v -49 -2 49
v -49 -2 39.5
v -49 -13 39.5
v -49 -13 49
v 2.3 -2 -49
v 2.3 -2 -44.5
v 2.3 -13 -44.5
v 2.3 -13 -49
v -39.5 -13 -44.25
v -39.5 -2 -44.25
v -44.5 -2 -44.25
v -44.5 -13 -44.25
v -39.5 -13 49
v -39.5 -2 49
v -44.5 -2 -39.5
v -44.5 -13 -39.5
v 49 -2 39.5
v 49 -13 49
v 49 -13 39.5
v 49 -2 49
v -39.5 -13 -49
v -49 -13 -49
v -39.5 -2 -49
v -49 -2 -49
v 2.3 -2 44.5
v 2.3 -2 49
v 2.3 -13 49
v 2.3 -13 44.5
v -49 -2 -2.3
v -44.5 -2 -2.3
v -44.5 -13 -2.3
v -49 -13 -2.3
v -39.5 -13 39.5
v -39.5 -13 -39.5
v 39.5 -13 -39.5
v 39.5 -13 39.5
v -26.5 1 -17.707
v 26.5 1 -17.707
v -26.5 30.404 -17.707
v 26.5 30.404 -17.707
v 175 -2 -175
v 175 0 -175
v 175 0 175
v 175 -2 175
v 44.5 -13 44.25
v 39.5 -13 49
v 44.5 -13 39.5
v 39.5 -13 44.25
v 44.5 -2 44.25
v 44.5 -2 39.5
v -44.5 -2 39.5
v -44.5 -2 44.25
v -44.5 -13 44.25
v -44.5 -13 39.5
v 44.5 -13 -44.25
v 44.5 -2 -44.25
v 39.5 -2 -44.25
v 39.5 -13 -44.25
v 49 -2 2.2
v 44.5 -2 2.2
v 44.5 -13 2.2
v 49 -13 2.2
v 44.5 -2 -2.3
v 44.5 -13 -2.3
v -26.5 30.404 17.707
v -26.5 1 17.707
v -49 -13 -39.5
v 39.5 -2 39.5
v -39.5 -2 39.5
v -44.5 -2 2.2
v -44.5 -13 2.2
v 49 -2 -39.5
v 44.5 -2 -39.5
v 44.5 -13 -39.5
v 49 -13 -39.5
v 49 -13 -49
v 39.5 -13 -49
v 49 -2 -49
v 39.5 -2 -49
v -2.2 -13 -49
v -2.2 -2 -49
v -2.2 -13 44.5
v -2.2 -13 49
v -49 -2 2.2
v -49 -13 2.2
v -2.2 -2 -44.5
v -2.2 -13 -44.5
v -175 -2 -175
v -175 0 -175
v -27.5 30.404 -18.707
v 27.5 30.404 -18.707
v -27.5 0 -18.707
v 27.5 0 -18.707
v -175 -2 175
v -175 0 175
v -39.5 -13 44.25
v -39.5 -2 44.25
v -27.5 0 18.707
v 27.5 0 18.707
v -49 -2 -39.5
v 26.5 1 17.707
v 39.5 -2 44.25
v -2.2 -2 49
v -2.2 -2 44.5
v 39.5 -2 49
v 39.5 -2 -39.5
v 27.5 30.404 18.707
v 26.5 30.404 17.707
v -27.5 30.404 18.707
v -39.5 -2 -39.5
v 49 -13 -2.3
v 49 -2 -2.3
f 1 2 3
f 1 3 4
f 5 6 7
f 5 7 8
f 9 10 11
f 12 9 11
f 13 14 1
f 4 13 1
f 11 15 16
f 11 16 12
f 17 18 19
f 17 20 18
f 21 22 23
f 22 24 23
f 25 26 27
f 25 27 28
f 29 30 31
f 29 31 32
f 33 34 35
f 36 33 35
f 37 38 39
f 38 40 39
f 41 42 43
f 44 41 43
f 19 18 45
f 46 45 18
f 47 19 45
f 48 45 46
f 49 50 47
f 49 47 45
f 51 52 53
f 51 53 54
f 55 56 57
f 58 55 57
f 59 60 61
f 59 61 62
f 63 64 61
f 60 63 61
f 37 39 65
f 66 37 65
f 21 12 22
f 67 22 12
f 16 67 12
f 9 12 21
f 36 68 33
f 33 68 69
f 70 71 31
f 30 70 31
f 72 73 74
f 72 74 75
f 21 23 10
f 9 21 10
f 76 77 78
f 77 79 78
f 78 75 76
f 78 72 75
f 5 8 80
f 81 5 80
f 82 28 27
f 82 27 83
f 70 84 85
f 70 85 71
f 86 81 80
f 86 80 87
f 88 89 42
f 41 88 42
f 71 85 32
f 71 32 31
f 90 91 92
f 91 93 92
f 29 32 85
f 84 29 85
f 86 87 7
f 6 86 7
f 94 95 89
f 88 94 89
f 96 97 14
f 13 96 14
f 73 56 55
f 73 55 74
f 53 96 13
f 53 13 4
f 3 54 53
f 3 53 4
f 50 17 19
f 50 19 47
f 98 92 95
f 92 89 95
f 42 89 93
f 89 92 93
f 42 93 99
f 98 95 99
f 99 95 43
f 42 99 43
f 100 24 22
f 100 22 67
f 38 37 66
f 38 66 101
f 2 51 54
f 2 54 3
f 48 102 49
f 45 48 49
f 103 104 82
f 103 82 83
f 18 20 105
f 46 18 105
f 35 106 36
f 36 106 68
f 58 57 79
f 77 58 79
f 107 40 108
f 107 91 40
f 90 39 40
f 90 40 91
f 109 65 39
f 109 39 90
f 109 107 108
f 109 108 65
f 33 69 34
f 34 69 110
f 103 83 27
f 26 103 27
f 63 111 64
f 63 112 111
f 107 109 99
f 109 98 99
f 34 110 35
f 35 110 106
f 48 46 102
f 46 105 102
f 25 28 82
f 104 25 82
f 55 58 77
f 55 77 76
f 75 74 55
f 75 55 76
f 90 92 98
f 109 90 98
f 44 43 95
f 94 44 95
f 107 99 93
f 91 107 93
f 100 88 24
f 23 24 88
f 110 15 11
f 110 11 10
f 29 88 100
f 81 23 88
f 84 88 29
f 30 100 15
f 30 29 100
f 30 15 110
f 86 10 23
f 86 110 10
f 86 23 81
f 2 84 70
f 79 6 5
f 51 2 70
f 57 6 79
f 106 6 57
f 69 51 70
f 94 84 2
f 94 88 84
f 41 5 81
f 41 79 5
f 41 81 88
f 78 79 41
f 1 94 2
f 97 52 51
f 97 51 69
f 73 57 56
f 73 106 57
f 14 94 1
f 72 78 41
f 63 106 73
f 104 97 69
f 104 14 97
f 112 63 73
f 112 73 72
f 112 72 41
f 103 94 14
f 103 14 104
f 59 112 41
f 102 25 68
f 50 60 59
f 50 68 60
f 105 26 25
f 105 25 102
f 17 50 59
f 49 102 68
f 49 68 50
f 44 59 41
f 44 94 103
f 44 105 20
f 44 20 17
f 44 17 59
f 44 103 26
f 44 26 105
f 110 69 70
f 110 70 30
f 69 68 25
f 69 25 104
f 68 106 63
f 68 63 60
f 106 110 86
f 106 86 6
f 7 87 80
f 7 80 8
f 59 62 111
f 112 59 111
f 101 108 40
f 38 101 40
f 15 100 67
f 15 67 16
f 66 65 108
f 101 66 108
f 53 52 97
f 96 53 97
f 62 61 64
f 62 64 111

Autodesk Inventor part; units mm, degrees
ref_plane "YZ Plane" through (0, 0, 0) normal (1, 0, 0) x (0, 1, 0)
ref_plane "XZ Plane" through (0, 0, 0) normal (0, 1, 0) x (-1, 0, 0)
ref_plane "XY Plane" through (0, 0, 0) normal (0, 0, 1) x (1, 0, 0)
sketch "Sketch1" plane through (0, 0, 0) normal (0, 1, 0) x (-1, 0, 0)
  line L0 (27.5, 18.707) -> (-27.5, 18.707)
  line L1 (-27.5, 18.707) -> (-27.5, -18.707)
  line L2 (-27.5, -18.707) -> (27.5, -18.707)
  line L3 (27.5, -18.707) -> (27.5, 18.707)
  line L4 (27.5, 18.707) -> (-27.5, -18.707) construction
  line L5 (-27.5, 18.707) -> (27.5, -18.707) construction
  point P0 (0, 0)
  dimension "d0" = 37.414
  dimension "d1" = 55
extrude "Extrusion1" add sketch "Sketch1" along normal blind 30.404
sketch "Sketch2" plane through (0, 30.404, 0) normal (0, 1, 0) x (1, 0, 0)
  line L0 (-26.5, -17.707) -> (26.5, -17.707)
  line L1 (26.5, -17.707) -> (26.5, 17.707)
  line L2 (26.5, 17.707) -> (-26.5, 17.707)
  line L3 (-26.5, 17.707) -> (-26.5, -17.707)
  line L4 (-26.5, -17.707) -> (26.5, 17.707) construction
  line L5 (26.5, -17.707) -> (-26.5, 17.707) construction
  point P0 (0, 0)
  dimension "d4" = 35.414
  dimension "d5" = 53
extrude "Extrusion2" cut sketch "Sketch2" against normal blind 29.404
sketch "Sketch6" plane through (0, 0, 0) normal (0, -1, 0) x (1, 0, 0)
  line L0 (175, 175) -> (-175, 175)
  line L1 (-175, 175) -> (-175, -175)
  line L2 (-175, -175) -> (175, -175)
  line L3 (175, -175) -> (175, 175)
  line L4 (175, 175) -> (-175, -175) construction
  line L5 (-175, 175) -> (175, -175) construction
  point P0 (0, 0)
  dimension "d19" = 350
  dimension "d20" = 350
extrude "Extrusion4" add sketch "Sketch6" along normal blind 2
sketch "Sketch7" plane through (0, -2, 0) normal (0, -1, 0) x (1, 0, 0)
  line L0 (39.5, 39.5) -> (-39.5, 39.5)
  line L1 (-39.5, 39.5) -> (-39.5, -39.5)
  line L2 (-39.5, -39.5) -> (39.5, -39.5)
  line L3 (39.5, -39.5) -> (39.5, 39.5)
  line L4 (39.5, 39.5) -> (-39.5, -39.5) construction
  line L5 (-39.5, 39.5) -> (39.5, -39.5) construction
  point P0 (0, 0)
  dimension "d23" = 79
  dimension "d24" = 79
extrude "Extrusion5" add sketch "Sketch7" along normal blind 11
sketch "Sketch8" plane through (0, -2, 0) normal (0, -1, 0) x (1, 0, 0)
  line L0 (2.3, -49) -> (-2.2, -49)
  line L1 (-2.2, -49) -> (-2.2, -44.5)
  line L2 (-2.2, -44.5) -> (2.3, -44.5)
  line L3 (2.3, -44.5) -> (2.3, -49)
  line L4 (2.3, -49) -> (-2.2, -44.5) construction
  line L5 (-2.2, -49) -> (2.3, -44.5) construction
  line L6 (-39.5, -39.5) -> (39.5, -39.5) projected
  line L7 (-175, 175) -> (-175, -175) projected
  point P0 (0, 0)
  point P1 (0.05, -46.75)
  dimension "d27" = 5
  dimension "d28" = 4.5
  dimension "d29" = 4.5
  dimension "d30" = 172.8
extrude "Extrusion6" add sketch "Sketch8" along normal blind 11
mirror "Mirror1" about plane through (0, 0, 0) normal (0, 0, 1) of "Extrusion6"
sketch "Sketch9" plane through (0, -2, 0) normal (0, -1, 0) x (1, 0, 0)
  line L0 (49, -2.3) -> (44.5, -2.3)
  line L1 (44.5, -2.3) -> (44.5, 2.2)
  line L2 (44.5, 2.2) -> (49, 2.2)
  line L3 (49, 2.2) -> (49, -2.3)
  line L4 (49, -2.3) -> (44.5, 2.2) construction
  line L5 (44.5, -2.3) -> (49, 2.2) construction
  line L6 (39.5, -39.5) -> (39.5, 39.5) projected
  line L7 (175, 175) -> (-175, 175) projected
  point P0 (0, 0)
  point P1 (46.75, -0.05)
  dimension "d33" = 5
  dimension "d34" = 4.5
  dimension "d35" = 4.5
  dimension "d36" = 172.8
extrude "Extrusion7" add sketch "Sketch9" along normal blind 11
mirror "Mirror2" about plane through (0, 0, 0) normal (1, 0, 0) of "Extrusion7"
sketch "Sketch10" plane through (0, -2, 0) normal (0, -1, 0) x (1, 0, 0)
  line L0 (49, 2.2) -> (49, -2.3) projected
  line L1 (49, -2.3) -> (49, -53.869)
  line L2 (2.3, -49) -> (58.6283, -49)
  line L3 (49, -49) -> (44.5, -49)
  line L4 (44.5, -49) -> (44.5, -39.5)
  line L5 (44.5, -39.5) -> (49, -39.5)
  line L6 (49, -39.5) -> (49, -49)
  line L7 (44.5, -44.25) -> (39.5, -44.25)
  line L8 (39.5, -44.25) -> (39.5, -49)
  line L9 (39.5, -49) -> (44.5, -49)
  line L10 (44.5, -49) -> (44.5, -44.25)
  point P0 (0, 0)
  dimension "d39" = 9.5
  dimension "d40" = 4.5
  dimension "d41" = 5
  dimension "d42" = 4.75
extrude "Extrusion8" add sketch "Sketch10" along normal blind 11
mirror "Mirror3" about plane through (0, 0, 0) normal (0, 0, 1) of "Extrusion8"
mirror "Mirror4" about plane through (0, 0, 0) normal (1, 0, 0) of "Extrusion8", "Mirror3"
properties part number "Motor-support_chassis-fit_hold-wheels_spencermical_ENES100-OSV"
